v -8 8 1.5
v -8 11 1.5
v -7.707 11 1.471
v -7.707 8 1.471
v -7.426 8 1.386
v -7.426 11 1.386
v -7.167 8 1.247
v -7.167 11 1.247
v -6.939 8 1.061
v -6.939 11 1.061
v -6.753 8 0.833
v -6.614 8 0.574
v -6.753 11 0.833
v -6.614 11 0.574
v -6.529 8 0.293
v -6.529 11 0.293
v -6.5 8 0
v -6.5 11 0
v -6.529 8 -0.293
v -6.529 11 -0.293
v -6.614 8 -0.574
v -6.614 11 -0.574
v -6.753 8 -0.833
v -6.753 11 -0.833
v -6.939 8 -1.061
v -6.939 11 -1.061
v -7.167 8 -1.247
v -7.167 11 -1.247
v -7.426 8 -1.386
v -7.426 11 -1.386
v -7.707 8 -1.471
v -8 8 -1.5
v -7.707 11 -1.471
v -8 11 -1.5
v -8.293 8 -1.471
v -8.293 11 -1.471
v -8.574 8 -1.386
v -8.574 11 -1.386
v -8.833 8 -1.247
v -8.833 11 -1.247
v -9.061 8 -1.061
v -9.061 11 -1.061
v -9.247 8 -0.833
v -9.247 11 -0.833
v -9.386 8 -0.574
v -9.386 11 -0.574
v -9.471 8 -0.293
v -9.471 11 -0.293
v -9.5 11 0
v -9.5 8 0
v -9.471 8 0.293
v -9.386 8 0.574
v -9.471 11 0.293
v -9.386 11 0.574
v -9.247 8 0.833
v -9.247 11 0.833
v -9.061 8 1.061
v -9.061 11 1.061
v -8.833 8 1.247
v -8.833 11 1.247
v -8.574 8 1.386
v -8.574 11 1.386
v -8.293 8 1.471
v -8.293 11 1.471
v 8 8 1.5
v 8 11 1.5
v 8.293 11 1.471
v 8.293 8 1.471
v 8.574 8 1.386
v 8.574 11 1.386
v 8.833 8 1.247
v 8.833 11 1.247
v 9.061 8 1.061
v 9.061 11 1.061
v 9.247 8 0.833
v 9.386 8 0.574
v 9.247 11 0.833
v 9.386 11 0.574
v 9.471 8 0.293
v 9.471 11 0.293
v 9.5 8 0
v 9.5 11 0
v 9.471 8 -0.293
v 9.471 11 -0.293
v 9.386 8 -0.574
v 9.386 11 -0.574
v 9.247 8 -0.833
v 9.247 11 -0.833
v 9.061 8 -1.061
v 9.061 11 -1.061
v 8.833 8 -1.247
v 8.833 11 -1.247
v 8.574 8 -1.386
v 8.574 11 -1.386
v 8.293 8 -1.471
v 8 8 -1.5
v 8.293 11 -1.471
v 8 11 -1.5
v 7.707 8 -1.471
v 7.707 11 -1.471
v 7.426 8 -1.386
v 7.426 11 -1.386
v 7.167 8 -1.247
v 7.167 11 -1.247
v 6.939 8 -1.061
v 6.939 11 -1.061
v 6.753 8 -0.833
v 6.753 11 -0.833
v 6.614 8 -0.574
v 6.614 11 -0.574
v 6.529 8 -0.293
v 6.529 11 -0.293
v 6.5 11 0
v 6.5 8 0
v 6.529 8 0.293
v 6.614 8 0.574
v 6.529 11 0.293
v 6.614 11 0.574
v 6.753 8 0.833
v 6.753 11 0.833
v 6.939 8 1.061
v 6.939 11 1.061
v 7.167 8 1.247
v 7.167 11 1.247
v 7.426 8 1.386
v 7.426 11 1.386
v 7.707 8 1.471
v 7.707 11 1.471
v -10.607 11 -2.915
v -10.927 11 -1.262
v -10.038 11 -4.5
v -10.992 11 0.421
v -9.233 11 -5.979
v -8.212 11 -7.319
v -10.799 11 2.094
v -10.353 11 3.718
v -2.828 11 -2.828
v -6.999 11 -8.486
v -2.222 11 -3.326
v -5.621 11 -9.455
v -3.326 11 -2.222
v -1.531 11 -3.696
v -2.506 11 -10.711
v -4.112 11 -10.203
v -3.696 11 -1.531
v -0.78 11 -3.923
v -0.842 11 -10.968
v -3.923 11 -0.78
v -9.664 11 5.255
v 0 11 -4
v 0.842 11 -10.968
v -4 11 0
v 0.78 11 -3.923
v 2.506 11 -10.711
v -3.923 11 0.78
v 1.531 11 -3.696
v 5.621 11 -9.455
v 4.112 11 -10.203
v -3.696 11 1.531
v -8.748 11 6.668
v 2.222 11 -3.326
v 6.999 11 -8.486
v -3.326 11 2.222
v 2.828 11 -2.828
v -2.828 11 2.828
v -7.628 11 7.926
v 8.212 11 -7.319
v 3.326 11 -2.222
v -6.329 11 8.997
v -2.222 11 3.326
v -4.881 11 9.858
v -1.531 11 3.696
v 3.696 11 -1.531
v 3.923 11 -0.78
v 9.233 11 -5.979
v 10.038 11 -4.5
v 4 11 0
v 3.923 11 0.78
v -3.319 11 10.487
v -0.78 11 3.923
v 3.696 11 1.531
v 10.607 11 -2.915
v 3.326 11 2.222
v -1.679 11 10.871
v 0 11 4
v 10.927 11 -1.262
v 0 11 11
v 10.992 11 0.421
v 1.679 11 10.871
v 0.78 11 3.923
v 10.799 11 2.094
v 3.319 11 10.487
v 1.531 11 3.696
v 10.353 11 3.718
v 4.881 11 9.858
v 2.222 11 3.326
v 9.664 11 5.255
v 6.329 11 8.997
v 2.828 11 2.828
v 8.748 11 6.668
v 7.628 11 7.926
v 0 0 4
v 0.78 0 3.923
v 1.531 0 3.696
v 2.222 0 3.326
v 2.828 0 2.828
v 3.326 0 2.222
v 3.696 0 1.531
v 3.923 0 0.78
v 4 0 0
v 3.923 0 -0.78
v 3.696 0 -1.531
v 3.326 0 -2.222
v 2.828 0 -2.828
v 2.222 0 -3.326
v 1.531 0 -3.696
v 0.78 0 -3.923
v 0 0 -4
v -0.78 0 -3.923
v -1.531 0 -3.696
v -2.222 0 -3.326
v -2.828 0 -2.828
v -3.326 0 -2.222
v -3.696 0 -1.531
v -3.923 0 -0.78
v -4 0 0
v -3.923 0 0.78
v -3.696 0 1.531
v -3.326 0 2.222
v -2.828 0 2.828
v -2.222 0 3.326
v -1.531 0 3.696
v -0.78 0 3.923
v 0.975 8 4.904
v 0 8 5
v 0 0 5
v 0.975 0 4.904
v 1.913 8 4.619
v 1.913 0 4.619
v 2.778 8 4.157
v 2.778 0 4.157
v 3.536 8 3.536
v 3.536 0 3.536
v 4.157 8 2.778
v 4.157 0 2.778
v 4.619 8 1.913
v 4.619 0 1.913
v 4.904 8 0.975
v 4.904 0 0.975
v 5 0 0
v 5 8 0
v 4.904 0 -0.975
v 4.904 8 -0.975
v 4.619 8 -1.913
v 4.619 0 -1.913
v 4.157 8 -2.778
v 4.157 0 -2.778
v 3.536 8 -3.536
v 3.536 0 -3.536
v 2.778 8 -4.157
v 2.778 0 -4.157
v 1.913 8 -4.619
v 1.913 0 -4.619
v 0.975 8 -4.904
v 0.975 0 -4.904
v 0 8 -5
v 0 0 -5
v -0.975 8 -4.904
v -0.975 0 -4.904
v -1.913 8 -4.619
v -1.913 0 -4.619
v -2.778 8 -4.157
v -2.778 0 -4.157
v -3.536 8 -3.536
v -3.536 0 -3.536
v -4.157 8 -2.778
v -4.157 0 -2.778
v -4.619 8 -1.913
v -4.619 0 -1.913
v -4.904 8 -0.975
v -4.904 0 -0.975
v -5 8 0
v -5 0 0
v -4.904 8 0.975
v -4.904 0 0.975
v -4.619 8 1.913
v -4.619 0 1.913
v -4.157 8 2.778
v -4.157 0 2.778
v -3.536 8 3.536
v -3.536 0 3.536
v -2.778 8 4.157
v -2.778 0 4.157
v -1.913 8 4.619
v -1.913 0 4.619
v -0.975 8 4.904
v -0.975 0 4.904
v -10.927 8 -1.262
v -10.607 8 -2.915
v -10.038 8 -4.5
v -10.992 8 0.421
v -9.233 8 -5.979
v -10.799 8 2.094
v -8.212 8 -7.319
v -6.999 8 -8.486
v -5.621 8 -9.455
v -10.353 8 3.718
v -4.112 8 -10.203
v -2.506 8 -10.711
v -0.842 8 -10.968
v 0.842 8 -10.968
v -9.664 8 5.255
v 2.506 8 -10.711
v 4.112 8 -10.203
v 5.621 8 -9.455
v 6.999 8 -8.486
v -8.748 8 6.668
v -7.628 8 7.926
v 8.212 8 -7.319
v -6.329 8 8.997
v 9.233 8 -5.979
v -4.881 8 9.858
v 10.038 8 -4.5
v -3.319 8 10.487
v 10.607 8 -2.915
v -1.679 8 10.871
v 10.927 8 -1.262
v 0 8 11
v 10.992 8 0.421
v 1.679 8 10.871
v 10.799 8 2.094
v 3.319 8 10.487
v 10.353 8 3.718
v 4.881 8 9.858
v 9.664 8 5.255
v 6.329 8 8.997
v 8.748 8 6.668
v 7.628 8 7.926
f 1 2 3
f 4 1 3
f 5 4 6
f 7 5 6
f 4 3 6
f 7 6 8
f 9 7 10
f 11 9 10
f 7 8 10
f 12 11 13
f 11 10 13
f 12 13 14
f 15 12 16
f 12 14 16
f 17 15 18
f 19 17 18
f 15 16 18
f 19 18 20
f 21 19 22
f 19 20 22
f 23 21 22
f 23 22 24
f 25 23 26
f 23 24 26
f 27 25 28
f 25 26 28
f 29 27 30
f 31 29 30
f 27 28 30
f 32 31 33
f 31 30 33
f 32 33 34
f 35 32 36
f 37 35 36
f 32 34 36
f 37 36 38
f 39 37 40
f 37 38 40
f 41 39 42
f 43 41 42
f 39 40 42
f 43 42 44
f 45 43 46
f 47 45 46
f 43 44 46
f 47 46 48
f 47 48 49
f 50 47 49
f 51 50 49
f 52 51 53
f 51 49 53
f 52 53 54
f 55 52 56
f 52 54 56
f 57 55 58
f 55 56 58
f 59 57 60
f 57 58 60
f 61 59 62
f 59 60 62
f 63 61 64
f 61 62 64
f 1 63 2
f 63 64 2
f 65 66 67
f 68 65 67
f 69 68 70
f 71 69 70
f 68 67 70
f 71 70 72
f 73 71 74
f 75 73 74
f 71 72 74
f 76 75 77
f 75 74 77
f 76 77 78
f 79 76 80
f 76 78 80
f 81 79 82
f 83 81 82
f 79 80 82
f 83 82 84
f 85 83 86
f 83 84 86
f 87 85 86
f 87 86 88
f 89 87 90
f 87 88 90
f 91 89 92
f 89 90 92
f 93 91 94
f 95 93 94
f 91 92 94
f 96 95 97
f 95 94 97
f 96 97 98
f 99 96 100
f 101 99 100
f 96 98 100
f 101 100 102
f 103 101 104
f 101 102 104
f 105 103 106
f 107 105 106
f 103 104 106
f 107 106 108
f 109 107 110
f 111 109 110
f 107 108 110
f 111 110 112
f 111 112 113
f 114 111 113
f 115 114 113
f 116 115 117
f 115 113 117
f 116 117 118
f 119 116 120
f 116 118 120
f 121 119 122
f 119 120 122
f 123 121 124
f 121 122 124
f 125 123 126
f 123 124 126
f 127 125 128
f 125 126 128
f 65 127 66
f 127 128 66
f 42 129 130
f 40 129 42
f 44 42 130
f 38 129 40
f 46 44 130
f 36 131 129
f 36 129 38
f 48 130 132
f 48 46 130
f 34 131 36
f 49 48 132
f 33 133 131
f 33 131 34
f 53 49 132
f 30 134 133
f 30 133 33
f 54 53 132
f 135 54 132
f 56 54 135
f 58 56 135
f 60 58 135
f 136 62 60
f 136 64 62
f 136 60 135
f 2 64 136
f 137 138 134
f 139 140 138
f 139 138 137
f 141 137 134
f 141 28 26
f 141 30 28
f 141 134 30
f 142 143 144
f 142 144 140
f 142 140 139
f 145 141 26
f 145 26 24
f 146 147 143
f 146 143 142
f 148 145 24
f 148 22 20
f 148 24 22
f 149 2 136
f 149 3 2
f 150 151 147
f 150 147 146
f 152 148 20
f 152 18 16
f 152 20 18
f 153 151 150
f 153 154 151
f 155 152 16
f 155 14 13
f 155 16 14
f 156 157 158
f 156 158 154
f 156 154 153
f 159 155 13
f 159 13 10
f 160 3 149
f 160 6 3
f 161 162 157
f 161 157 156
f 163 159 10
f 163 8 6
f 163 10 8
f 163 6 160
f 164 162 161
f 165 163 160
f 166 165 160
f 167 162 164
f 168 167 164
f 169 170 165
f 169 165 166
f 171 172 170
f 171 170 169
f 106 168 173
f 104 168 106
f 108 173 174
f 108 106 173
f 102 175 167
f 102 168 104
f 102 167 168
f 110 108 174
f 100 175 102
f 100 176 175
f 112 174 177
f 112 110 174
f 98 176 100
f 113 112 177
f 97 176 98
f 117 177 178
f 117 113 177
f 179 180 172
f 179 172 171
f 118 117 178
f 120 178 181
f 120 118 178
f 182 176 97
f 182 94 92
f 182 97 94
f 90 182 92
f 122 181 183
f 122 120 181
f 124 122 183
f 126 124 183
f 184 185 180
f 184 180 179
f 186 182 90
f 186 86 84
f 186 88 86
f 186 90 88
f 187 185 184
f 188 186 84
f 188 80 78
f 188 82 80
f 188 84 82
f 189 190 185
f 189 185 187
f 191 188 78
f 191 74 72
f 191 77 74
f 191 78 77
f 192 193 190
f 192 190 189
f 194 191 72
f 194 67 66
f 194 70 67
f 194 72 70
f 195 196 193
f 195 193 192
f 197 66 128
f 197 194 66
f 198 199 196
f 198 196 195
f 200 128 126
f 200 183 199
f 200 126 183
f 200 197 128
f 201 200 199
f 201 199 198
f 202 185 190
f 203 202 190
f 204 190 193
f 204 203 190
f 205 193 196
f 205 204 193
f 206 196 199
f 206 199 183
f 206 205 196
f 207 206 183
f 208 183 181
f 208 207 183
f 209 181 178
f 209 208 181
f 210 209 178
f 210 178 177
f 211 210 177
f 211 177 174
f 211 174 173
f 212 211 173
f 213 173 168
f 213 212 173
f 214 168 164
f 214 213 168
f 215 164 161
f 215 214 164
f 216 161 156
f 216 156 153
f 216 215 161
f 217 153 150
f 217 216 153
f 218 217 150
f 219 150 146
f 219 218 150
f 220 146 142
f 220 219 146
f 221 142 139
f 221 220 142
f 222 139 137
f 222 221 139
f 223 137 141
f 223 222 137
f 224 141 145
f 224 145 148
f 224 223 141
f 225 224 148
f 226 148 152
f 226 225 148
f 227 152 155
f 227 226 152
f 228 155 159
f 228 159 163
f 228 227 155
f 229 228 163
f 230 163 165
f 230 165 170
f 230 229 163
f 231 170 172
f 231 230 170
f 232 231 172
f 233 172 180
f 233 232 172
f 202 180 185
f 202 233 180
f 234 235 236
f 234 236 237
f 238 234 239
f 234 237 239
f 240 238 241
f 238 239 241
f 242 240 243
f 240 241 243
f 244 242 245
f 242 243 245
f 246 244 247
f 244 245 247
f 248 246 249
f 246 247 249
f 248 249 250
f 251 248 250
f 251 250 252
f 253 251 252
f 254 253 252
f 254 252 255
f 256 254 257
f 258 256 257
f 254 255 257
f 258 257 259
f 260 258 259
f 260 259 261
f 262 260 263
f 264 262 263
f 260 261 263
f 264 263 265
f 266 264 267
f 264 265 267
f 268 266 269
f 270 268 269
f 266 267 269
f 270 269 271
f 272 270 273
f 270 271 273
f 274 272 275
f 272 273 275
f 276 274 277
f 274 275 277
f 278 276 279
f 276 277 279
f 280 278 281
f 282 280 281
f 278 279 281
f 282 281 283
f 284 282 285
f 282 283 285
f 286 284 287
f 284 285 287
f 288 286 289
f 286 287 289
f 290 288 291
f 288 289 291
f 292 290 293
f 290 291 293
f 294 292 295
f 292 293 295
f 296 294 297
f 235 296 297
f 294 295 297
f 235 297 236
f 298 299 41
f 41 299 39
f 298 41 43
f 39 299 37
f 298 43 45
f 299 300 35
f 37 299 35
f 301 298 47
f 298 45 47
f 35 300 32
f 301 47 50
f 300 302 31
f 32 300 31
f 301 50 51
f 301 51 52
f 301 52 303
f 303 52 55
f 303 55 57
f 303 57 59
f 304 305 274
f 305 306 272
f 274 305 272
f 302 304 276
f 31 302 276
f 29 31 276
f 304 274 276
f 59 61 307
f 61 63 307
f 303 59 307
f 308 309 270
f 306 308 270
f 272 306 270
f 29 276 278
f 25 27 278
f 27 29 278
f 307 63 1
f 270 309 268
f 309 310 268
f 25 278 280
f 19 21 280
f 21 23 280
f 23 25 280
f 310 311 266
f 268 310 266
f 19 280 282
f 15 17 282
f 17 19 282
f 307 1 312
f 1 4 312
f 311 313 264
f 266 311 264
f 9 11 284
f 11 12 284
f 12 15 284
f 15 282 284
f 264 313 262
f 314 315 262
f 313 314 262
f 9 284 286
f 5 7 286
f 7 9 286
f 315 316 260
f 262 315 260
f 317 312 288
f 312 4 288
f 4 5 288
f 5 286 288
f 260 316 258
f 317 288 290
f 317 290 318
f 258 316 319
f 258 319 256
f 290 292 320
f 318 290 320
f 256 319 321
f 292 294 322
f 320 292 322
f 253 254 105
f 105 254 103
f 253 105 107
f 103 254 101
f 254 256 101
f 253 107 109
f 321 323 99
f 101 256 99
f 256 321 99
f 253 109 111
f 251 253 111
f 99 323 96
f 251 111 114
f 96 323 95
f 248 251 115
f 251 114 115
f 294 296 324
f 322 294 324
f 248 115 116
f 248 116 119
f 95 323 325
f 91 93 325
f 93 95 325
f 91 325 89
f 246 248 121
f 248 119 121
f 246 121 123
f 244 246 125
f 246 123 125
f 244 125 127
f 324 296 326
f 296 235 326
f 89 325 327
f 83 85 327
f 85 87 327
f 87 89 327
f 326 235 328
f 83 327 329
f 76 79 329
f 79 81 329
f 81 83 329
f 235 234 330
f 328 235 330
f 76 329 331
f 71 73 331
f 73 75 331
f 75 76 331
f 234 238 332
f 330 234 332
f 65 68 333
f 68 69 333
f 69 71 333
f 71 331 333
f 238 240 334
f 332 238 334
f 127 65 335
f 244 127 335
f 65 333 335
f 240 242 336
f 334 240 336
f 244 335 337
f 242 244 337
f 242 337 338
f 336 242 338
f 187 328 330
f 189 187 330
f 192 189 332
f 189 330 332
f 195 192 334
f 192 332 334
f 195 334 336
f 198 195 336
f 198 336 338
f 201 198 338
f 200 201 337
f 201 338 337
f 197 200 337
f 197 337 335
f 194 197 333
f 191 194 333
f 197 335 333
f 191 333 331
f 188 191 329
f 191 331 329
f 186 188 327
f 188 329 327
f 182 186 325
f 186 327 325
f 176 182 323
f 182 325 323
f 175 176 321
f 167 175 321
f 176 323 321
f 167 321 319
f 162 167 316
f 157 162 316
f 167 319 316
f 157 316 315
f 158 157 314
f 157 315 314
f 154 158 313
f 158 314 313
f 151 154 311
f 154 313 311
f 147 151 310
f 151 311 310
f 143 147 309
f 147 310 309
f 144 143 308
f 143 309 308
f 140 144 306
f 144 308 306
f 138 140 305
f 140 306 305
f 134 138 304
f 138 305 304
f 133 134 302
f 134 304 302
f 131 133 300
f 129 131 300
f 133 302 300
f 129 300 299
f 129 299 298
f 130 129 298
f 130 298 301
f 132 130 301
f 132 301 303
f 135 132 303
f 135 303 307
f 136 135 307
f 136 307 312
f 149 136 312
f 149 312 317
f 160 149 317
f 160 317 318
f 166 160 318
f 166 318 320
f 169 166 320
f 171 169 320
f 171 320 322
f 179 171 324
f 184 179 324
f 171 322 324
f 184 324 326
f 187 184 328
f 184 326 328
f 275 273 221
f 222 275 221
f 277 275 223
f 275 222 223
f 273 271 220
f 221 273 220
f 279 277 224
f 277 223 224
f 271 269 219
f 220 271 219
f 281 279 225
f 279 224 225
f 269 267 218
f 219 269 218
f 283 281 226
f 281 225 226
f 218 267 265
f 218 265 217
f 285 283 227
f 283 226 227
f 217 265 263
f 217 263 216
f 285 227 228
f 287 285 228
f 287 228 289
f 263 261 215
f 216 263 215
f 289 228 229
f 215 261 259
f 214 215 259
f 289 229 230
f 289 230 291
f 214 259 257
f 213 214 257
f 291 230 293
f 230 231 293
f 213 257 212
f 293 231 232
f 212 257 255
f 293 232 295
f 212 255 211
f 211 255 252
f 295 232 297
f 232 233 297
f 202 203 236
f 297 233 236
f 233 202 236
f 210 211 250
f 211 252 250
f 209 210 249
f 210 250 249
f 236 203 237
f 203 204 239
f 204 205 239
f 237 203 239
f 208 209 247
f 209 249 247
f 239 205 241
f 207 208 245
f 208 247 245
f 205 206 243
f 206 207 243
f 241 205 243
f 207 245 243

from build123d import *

# Parameters (mm, degrees)
SKICA1_R                 = 5
SKICA1_R_2               = 4
P_IDAT_VYSUNUT_M1_DEPTH  = 8
SKICA2_R                 = 11
SKICA2_R_2               = 4
P_IDAT_VYSUNUT_M2_DEPTH  = 3
SKICA3_R                 = 1.5
ODEBRAT_VYSUNUT_M3_DEPTH = 3


with BuildPart() as part:
    # Skica1 → Přidat vysunutím1 (new body)
    with BuildSketch(Plane(origin=(0, 0, 0), x_dir=(1, 0, 0), z_dir=(0, 1, 0))):
        with Locations(Location((0, 0, 0), (0, 0, 270))):
            Circle(SKICA1_R)
        with Locations(Location((0, 0, 0), (0, 0, 270))):
            Circle(SKICA1_R_2, mode=Mode.SUBTRACT)
    extrude(amount=P_IDAT_VYSUNUT_M1_DEPTH)

    # Skica2 → Přidat vysunutím2 (add)
    with BuildSketch(Plane(origin=(0, 8, 0), x_dir=(1, 0, 0), z_dir=(0, 1, 0))):
        with Locations(Location((0, 0, 0), (0, 0, 270))):
            Circle(SKICA2_R)
        with Locations(Location((0, 0, 0), (0, 0, 270))):
            Circle(SKICA2_R_2, mode=Mode.SUBTRACT)
    extrude(amount=P_IDAT_VYSUNUT_M2_DEPTH)

    # Skica3 → Odebrat vysunutím3 (cut)
    with BuildSketch(Plane(origin=(0, 11, 0), x_dir=(1, 0, 0), z_dir=(0, 1, 0))):
        with Locations(Location((8, 0, 0), (0, 0, 270))):
            Circle(SKICA3_R)
        with Locations(Location((-8, 0, 0), (0, 0, 270))):
            Circle(SKICA3_R)
    extrude(amount=-ODEBRAT_VYSUNUT_M3_DEPTH, mode=Mode.SUBTRACT)


solid = part.part
